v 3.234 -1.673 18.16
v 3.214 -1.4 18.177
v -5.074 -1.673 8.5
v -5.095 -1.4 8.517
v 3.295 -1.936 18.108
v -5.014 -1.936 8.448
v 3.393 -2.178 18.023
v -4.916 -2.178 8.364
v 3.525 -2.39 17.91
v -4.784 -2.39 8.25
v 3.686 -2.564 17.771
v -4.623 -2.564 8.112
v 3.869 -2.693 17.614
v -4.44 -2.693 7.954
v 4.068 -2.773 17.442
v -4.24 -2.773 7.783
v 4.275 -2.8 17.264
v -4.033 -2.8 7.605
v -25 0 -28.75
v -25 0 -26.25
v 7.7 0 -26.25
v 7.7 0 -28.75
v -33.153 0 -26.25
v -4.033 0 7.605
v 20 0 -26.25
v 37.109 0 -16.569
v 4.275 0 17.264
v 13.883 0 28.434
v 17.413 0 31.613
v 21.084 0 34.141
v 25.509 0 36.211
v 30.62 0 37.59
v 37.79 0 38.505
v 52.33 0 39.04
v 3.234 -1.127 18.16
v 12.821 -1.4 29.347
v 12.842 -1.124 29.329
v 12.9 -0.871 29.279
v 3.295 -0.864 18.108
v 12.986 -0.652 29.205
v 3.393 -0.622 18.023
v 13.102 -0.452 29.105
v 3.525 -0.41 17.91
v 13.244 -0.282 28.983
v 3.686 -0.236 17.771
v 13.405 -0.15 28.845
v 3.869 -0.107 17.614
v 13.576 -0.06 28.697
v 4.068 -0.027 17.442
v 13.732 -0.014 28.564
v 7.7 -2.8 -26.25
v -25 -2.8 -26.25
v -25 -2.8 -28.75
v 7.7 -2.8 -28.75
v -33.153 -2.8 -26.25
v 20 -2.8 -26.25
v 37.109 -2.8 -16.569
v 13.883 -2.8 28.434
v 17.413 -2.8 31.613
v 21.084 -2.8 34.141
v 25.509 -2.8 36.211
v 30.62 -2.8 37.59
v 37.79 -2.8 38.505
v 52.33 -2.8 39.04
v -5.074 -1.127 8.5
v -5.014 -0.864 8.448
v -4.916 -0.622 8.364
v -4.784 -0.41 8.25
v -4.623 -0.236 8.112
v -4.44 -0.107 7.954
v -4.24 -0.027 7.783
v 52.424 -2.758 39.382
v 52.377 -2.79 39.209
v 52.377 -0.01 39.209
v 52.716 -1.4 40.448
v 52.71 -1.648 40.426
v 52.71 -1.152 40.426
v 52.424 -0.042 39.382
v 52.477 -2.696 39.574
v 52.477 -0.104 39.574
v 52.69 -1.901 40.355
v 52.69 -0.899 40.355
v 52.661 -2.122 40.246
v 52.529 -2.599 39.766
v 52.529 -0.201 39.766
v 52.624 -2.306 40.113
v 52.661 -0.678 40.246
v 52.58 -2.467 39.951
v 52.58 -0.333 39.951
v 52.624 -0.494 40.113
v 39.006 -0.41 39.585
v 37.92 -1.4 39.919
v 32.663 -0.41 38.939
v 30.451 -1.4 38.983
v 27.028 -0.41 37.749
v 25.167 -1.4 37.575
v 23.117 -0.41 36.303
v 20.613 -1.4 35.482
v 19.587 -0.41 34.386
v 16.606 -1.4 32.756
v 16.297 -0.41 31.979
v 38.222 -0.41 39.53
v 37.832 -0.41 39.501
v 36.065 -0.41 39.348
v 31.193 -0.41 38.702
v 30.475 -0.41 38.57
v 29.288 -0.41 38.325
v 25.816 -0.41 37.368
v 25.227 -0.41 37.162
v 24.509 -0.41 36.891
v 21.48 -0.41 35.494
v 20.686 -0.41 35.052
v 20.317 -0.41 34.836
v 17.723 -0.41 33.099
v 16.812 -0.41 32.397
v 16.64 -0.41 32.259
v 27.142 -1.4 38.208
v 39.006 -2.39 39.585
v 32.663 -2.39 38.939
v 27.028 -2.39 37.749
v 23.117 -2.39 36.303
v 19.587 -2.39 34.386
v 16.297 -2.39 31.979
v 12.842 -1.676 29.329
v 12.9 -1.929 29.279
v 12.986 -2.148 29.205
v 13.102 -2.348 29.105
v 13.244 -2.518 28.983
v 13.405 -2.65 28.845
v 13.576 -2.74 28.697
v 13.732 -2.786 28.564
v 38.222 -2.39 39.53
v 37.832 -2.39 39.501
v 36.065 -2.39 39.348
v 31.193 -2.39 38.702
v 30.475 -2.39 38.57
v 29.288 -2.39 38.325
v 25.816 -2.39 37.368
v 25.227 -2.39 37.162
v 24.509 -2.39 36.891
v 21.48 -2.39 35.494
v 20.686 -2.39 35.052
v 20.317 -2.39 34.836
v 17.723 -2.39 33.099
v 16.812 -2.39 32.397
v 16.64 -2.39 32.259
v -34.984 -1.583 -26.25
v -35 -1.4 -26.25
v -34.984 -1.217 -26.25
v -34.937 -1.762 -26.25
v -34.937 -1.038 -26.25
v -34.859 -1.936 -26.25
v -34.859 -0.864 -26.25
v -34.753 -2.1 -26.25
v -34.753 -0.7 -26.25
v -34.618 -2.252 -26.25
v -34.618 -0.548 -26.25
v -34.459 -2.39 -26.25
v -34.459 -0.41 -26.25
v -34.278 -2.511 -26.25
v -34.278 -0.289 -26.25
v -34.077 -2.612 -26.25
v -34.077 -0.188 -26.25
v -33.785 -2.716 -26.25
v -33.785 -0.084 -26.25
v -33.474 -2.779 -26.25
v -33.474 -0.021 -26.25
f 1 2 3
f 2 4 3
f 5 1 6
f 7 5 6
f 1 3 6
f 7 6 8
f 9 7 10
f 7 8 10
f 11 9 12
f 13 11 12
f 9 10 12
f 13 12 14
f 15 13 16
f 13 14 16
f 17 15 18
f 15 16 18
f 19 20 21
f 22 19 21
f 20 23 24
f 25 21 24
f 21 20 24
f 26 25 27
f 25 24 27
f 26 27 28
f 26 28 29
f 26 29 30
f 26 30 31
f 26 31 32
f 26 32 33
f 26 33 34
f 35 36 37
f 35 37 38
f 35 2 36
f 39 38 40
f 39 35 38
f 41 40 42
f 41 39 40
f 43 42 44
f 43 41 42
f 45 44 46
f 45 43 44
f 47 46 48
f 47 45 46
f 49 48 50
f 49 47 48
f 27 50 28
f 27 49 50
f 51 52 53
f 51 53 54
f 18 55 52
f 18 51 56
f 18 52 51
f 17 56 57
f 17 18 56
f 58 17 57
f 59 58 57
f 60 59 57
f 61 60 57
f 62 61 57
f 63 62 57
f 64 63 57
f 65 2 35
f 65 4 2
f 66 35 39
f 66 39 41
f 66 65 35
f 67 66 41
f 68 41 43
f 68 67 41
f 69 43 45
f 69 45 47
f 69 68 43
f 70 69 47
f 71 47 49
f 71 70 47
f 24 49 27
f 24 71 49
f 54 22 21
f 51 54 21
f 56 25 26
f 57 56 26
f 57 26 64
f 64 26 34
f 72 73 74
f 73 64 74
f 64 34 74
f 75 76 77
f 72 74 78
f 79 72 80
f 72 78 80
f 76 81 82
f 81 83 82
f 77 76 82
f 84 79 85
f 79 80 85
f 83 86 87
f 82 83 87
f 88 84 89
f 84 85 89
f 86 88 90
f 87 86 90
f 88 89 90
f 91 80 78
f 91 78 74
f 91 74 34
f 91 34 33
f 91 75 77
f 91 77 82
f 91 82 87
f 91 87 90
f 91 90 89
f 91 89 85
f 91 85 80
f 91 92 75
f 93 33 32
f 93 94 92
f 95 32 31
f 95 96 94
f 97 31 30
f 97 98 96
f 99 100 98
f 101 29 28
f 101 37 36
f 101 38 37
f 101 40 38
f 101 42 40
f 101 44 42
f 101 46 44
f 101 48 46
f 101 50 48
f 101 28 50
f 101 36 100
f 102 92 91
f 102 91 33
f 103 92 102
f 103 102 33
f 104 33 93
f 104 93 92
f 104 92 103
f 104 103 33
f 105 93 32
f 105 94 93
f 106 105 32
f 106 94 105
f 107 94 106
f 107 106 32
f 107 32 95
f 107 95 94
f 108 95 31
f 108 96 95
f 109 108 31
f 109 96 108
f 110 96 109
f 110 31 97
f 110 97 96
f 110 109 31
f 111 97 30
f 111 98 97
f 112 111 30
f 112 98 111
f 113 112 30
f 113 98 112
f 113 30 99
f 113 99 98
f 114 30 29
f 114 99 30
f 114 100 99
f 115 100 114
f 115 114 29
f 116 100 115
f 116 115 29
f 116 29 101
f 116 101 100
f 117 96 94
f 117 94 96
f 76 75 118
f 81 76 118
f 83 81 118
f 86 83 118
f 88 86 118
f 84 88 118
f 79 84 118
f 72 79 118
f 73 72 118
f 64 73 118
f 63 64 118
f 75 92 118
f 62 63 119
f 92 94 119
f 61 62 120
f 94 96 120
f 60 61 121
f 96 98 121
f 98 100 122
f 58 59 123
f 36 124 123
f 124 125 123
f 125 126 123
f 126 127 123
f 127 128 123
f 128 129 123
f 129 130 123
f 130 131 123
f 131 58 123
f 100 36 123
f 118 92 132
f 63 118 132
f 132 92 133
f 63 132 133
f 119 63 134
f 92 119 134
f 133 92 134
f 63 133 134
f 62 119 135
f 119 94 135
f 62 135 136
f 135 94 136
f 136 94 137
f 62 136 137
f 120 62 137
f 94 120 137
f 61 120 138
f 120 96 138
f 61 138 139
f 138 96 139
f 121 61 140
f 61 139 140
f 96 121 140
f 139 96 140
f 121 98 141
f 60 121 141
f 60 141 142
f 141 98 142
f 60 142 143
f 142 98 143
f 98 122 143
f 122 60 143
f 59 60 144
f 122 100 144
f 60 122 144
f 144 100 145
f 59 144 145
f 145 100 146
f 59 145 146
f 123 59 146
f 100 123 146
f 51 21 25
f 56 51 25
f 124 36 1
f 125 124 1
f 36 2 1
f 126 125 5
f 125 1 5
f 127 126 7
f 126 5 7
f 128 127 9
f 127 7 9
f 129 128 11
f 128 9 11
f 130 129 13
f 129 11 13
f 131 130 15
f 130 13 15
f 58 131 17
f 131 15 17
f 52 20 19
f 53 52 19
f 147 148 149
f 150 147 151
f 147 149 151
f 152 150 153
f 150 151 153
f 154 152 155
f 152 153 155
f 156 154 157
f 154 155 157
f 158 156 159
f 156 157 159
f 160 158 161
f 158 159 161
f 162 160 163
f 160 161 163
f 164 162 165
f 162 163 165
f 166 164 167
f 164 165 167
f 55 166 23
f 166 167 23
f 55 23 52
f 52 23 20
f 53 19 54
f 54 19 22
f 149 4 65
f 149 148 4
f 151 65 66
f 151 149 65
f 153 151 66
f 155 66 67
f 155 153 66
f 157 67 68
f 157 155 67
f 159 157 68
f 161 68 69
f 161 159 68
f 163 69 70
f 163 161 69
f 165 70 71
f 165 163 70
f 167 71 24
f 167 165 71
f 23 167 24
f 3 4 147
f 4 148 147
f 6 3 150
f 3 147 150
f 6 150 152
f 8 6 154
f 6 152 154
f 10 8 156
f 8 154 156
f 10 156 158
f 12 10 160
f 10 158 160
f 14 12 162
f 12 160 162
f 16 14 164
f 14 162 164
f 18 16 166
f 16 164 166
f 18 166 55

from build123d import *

# Parameters (mm, degrees)
F1_DEPTH = 2.8
F2_R     = 1.3999


# Not quite as in the source:
# - a fillet or chamfer is up to 0.001 mm smaller than in the source, because OpenCascade refuses the exact size
# - a feature names something its author has since deleted; it is built from what else it names


with BuildPart() as f1:
    # F0 (on Front) → F1 (new body)
    with BuildSketch(Plane.XZ):
        with BuildLine():
            Line((-25, -28.75), (7.7, -28.75))
            Line((7.7, -28.75), (7.7, -26.25))
            Line((7.7, -26.25), (20, -26.25))
            Line((20, -26.25), (37.1087677777, -16.5689531714))
            Line((37.1087677777, -16.5689531714), (52.7158603072, 40.4480434954))
            add(Edge.make_bspline(
                [(12.8214843672, 29.3465693193), (17.0304067433, 33.5662439466), (26.6575691876, 40.2533537434), (43.750764433, 40.2343917171), (52.7158603072, 40.4480434954)],
                knots=[0, 0, 0, 0, 0.4474896075, 1, 1, 1, 1], degree=3))
            Line((12.8214843672, 29.3465693193), (3.2140899724, 18.1771508975))
            Line((3.2140899724, 18.1771508975), (-5.0946967868, 8.517475019))
            Line((-5.0946967868, 8.517475019), (-35, -26.25))
            Line((-35, -26.25), (-25, -26.25))
            Line((-25, -26.25), (-25, -28.75))
        make_face()
    extrude(amount=F1_DEPTH)

    # F2 (radius 1.4 in the source; OpenCascade refuses exactly that, so slightly less here)
    f2_edges = [f1.edges().sort_by_distance(p)[0] for p in [
        (-11.089258, -2.8, 1.548285),
        (-11.089258, 0, 1.548285),
        (31.385103, -2.8, 39.151355),
        (31.385103, 0, 39.151355),
    ]]
    fillet(f2_edges, radius=F2_R)


solid = f1.part
